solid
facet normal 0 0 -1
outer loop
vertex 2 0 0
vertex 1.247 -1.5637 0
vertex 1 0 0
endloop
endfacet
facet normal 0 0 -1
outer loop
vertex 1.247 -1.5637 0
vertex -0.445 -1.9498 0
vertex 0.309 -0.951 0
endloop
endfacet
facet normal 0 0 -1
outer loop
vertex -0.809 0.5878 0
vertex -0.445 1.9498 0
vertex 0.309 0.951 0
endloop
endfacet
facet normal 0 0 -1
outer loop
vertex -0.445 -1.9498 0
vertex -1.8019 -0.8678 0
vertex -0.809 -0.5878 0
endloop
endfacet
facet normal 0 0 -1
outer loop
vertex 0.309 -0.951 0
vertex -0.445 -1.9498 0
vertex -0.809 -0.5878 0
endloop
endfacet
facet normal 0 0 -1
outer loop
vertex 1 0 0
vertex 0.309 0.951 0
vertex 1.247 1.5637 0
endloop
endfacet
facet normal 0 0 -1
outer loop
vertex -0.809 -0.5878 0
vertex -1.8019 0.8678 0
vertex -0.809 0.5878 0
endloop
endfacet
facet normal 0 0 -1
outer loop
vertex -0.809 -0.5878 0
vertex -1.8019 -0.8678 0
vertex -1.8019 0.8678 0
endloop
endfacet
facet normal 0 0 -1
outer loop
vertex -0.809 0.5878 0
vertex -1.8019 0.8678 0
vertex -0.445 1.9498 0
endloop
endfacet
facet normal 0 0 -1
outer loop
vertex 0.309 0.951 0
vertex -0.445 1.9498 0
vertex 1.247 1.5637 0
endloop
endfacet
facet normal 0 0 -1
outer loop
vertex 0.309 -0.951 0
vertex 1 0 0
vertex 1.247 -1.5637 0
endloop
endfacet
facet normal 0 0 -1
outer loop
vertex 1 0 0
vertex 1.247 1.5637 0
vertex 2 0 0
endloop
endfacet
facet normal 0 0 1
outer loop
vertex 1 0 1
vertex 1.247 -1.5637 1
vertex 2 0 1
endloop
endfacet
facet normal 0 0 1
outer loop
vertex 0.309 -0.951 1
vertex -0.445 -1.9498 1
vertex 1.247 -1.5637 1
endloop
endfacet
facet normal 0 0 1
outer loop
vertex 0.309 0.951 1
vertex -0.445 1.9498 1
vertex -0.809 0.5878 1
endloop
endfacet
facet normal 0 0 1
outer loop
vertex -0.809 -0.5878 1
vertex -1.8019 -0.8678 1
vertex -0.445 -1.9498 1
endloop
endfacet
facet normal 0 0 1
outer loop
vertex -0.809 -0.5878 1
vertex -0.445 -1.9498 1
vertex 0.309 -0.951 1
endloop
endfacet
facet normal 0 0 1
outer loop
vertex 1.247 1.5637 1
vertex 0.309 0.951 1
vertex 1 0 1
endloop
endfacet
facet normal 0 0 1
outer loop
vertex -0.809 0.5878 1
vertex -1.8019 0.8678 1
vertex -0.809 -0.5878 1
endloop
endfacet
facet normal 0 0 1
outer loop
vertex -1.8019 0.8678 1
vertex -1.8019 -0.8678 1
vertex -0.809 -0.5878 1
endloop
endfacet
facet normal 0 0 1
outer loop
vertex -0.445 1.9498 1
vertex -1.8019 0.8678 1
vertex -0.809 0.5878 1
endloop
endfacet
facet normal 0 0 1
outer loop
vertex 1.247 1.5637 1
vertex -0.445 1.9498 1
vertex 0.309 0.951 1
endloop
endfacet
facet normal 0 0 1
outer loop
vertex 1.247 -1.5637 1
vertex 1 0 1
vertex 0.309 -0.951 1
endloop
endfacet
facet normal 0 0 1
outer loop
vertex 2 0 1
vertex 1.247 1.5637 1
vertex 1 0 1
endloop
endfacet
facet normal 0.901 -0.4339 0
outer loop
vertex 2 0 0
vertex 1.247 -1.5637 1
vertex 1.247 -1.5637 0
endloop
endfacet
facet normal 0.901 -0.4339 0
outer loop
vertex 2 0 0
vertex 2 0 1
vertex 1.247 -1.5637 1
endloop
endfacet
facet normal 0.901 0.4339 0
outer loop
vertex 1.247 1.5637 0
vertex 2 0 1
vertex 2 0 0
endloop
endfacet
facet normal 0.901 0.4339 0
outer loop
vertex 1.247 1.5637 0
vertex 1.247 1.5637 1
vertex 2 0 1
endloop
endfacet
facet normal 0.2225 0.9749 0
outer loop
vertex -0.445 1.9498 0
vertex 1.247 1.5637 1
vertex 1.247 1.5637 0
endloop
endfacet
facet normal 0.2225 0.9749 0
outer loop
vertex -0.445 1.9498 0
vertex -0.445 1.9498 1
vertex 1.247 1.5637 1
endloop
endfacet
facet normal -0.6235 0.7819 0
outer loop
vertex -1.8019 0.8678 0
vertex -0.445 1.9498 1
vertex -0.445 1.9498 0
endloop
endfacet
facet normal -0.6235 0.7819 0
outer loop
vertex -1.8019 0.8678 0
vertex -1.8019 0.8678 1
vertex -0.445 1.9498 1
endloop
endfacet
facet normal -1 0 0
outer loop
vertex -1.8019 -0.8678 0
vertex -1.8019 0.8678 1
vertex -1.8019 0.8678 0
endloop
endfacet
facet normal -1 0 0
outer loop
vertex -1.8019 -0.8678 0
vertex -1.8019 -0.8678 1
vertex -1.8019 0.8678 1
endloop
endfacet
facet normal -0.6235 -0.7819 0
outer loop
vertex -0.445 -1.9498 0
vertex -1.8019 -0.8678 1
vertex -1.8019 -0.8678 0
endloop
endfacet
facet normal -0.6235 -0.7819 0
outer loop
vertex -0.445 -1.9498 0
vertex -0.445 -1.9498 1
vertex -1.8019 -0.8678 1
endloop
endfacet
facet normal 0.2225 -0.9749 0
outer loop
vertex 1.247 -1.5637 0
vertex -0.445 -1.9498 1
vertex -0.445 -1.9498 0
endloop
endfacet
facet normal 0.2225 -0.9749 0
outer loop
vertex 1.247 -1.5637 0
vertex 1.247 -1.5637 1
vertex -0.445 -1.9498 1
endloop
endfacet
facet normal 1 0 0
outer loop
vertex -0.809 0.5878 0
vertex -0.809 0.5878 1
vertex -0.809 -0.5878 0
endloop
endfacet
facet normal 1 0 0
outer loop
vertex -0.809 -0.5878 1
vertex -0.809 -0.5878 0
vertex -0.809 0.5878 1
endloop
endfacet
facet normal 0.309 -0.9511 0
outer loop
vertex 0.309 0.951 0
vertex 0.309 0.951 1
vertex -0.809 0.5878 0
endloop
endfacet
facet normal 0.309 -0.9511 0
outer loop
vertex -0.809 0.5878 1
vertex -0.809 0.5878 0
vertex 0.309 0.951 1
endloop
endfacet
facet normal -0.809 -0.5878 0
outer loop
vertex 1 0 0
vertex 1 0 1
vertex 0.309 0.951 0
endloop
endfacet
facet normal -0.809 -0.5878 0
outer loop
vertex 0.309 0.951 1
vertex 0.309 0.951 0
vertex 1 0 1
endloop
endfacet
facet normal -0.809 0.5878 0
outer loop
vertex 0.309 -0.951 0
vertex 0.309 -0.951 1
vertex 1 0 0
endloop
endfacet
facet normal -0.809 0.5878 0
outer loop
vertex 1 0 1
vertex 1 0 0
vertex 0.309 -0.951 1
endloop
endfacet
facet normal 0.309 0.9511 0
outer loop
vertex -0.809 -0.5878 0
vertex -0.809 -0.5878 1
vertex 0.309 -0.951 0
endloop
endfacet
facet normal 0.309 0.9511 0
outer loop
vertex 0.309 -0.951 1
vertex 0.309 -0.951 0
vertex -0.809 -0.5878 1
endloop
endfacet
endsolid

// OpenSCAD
module Donut2D(major=2, minor=1) {
  difference() {
    circle(r=major);
    circle(r=minor);
  }
}

module Donut(major=2, minor=1, h=1) {
  linear_extrude(height=h)
  Donut2D(major, minor);
}

Donut();
